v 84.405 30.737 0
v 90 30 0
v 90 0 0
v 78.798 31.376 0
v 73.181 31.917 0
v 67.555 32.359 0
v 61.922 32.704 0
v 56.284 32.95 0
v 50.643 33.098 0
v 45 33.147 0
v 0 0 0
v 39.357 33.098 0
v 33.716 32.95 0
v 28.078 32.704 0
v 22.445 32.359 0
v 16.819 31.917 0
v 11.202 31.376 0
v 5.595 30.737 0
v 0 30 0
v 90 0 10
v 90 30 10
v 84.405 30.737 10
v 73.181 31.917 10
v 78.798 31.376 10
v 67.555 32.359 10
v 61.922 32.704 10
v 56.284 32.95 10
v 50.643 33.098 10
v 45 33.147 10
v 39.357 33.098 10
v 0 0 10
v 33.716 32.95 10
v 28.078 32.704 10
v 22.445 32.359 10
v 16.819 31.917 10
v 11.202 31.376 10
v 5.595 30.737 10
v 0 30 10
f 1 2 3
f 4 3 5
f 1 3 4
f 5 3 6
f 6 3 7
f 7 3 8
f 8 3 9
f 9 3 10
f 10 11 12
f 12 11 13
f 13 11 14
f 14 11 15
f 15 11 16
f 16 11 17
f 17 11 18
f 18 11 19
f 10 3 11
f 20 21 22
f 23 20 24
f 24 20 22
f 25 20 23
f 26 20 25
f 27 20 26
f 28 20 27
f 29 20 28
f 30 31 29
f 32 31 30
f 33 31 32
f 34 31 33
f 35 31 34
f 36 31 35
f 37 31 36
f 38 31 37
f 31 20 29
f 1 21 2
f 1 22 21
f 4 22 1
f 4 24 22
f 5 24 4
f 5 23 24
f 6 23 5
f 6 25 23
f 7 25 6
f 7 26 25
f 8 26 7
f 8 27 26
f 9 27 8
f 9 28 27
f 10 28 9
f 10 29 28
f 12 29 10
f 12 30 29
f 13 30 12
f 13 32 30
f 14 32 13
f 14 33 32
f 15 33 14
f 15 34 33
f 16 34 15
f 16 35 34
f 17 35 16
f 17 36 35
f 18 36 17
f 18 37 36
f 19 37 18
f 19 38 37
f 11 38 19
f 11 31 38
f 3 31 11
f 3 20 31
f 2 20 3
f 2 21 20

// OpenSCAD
$fn = 32;

// ----------------------------------------------------------------------
// Arc profile plate: crown, 19 points
// ----------------------------------------------------------------------

// --- parameters (mm) ---
bar_l = 90;               // bar length, X
bar_w = 30;               // bar height at the ends, Y
arc_r = 323.34;           // radius of the crown arc
arc_angle = 16;           // crown arc angle, degrees
crown_rise = 3.15;        // rise of the crown over the ends
arc_step = 1;             // sampling step of the crown arc, degrees
plate_t = 10;             // plate thickness, Z

bbox_y = bar_w + crown_rise;  // full height with the crown

profile = [[90, 30], [84.405, 30.737], [78.798, 31.376], [73.181, 31.917], [67.555, 32.359], [61.922, 32.704], [56.284, 32.95], [50.643, 33.098], [45, 33.147], [39.357, 33.098], [33.716, 32.95], [28.078, 32.704], [22.445, 32.359], [16.819, 31.917], [11.202, 31.376], [5.595, 30.737], [0, 30], [0, 0], [90, 0]];  // primary outline, 19 points, counter clockwise

// --- the one profile operation ---
linear_extrude(height = plate_t) polygon(points = profile);
